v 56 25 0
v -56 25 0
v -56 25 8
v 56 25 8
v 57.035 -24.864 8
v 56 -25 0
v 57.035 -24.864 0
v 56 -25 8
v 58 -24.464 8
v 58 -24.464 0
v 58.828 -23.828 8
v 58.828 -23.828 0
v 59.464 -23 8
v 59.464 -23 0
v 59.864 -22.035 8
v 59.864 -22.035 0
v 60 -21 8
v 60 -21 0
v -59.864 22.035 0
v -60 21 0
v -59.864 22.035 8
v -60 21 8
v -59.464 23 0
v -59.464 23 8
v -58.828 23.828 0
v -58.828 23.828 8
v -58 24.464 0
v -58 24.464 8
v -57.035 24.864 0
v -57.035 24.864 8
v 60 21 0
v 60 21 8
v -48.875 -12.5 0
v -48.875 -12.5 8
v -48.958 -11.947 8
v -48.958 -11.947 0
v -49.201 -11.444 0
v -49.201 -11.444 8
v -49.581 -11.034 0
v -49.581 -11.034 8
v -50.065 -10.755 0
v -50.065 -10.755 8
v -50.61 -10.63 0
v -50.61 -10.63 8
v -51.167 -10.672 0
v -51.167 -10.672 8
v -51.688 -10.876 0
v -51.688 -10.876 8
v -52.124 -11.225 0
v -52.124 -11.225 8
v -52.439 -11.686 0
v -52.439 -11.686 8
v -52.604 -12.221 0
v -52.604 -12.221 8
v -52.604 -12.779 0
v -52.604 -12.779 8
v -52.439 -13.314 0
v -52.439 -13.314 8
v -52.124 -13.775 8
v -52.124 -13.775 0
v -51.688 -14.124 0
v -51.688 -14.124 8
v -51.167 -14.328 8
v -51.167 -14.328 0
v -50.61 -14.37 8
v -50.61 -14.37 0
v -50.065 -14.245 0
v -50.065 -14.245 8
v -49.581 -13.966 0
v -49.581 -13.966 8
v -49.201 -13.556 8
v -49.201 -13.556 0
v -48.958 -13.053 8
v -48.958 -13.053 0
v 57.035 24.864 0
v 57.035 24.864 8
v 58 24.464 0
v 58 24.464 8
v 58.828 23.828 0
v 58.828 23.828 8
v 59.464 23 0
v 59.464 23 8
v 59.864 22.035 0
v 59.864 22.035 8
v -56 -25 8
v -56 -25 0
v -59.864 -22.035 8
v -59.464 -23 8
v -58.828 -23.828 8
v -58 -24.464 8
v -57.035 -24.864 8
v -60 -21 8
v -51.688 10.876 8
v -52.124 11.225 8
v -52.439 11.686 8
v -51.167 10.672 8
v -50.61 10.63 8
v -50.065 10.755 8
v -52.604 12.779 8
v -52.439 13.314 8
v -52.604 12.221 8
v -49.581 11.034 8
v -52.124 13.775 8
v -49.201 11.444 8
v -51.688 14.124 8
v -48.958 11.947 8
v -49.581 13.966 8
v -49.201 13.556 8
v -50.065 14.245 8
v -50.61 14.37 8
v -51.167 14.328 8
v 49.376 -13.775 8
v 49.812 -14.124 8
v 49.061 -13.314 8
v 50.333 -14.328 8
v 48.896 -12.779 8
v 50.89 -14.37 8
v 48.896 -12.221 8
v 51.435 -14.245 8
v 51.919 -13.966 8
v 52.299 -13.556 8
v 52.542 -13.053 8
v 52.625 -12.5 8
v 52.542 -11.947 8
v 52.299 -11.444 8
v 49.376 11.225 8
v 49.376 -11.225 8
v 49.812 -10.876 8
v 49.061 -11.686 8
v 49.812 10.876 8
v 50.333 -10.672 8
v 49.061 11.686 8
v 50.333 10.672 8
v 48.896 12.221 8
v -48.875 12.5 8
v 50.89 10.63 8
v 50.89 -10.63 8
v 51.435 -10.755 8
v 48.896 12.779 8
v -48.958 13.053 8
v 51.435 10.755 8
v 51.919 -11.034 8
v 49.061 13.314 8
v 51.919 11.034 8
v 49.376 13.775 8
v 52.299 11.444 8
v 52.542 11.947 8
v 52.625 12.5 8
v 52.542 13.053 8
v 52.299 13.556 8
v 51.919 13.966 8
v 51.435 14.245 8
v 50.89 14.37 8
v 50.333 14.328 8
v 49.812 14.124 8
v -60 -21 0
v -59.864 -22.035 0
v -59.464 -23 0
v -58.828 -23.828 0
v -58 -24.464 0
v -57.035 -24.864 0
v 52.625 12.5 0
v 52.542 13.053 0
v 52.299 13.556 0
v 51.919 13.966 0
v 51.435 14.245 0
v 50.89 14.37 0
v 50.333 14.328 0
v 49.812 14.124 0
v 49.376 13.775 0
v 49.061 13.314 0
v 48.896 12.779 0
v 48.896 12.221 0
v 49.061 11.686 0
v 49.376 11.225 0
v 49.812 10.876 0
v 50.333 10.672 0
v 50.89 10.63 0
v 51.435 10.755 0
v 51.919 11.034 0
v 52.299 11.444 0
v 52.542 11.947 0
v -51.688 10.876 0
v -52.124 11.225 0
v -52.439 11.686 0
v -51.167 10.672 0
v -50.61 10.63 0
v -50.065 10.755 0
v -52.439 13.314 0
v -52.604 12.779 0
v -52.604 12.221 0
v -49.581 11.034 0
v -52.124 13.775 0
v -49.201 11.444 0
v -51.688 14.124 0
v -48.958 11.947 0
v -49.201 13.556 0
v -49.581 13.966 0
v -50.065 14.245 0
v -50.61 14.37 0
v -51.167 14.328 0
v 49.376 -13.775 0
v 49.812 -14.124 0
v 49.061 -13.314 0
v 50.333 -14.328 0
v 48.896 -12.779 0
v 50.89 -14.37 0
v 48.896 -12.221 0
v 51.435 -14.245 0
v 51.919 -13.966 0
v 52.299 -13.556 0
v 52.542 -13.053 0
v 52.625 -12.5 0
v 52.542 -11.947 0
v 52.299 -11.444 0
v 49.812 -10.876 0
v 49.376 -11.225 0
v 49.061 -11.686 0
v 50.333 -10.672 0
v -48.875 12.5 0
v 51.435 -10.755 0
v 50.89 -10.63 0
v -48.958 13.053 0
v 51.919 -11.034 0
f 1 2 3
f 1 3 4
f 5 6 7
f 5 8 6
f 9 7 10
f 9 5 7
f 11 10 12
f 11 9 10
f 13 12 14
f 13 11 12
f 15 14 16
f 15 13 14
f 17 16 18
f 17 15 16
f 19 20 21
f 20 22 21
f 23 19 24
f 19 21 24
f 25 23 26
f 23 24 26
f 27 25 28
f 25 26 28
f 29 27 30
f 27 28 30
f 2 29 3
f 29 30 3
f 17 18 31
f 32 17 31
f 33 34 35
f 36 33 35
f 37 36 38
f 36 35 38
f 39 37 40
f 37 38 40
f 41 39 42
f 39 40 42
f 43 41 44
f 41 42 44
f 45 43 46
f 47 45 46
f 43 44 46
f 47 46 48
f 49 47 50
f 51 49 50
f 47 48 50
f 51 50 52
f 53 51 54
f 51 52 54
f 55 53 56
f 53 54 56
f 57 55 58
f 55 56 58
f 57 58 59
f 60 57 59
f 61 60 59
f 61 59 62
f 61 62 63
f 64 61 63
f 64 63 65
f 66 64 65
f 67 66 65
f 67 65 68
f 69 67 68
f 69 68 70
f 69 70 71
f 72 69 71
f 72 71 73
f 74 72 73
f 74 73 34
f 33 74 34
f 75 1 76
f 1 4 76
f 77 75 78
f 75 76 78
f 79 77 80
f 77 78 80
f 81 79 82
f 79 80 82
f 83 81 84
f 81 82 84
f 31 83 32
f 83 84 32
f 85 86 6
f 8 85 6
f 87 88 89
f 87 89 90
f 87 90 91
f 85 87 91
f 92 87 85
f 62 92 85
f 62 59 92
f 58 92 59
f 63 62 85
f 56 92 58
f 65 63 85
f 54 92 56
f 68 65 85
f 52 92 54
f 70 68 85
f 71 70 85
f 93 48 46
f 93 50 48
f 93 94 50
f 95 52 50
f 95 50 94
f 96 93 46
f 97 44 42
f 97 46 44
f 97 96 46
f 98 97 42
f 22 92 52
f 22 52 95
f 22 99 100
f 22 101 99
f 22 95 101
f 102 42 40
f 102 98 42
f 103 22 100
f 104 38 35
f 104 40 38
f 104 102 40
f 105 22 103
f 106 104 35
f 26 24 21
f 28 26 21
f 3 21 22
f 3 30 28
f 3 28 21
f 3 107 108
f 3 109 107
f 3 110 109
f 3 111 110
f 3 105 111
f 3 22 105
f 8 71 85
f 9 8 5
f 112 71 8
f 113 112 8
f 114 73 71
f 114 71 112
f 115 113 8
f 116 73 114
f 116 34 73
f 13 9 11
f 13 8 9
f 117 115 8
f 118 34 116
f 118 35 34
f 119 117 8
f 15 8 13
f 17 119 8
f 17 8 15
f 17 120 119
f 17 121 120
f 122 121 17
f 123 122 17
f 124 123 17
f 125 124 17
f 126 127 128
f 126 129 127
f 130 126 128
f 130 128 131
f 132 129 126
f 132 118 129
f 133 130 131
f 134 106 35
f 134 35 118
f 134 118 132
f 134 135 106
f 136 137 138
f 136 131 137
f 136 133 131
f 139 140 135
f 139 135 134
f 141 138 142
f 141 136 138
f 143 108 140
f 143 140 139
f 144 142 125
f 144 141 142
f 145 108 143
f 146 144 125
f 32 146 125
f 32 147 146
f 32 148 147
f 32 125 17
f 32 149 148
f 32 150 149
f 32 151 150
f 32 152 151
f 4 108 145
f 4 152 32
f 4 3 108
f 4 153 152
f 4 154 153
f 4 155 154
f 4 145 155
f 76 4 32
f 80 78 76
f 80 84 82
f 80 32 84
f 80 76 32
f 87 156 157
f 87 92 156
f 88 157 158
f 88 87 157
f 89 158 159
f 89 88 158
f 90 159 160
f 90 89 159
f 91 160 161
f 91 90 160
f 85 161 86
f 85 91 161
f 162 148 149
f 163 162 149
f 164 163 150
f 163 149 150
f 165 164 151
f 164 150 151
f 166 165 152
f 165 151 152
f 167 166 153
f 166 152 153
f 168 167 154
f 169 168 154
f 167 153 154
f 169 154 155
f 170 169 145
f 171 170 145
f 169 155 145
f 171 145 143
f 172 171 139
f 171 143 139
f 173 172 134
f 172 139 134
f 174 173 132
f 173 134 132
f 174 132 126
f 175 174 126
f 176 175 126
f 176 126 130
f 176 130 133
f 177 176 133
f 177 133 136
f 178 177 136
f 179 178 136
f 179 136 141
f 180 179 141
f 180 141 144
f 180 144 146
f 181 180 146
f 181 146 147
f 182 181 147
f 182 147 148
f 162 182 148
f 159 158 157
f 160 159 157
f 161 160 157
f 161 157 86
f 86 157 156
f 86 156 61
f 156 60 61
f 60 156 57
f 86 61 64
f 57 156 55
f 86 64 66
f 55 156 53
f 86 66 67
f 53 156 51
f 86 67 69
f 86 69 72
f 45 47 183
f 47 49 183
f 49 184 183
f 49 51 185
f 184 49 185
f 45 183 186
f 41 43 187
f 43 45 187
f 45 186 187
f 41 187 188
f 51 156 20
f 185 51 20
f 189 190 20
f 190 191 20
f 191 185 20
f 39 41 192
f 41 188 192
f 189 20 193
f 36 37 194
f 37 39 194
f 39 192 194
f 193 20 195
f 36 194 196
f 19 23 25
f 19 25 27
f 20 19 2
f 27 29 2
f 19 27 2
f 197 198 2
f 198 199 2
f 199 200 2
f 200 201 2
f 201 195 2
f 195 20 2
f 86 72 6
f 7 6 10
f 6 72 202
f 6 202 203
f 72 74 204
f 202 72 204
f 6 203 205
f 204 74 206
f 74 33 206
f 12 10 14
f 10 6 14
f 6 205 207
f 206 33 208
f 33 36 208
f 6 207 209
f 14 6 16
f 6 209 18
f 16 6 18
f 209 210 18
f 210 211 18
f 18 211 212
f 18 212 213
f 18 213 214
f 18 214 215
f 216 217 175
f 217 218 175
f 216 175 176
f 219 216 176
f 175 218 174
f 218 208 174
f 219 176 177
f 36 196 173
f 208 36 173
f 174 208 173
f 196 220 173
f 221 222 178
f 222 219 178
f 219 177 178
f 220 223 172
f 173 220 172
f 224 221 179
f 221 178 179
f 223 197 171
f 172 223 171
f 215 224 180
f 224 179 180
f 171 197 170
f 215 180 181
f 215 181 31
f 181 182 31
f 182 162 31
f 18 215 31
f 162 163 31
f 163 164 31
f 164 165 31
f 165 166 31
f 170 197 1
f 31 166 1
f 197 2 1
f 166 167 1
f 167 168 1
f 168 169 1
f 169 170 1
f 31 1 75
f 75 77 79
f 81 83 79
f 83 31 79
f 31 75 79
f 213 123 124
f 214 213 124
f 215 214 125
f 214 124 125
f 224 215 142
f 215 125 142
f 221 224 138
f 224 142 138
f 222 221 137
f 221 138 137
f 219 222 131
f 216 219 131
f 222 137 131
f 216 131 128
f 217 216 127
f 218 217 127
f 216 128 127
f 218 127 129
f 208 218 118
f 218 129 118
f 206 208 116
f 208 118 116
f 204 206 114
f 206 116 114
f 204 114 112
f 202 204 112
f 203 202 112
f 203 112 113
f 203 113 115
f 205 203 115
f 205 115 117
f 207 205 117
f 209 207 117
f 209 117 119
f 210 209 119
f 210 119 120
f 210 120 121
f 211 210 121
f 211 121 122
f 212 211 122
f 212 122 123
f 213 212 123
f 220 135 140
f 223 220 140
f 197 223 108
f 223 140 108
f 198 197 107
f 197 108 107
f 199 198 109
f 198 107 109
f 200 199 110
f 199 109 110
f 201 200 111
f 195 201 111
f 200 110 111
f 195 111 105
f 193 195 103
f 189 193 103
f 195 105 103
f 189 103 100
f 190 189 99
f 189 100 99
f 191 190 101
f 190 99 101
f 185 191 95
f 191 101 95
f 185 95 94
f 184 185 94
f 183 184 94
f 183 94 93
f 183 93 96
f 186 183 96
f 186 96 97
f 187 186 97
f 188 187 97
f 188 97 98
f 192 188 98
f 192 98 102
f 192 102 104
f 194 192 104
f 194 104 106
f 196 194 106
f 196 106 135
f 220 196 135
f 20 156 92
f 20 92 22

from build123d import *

# Parameters (mm, degrees)
SKETCH_W     = 120
SKETCH_H     = 50
PAD_DEPTH    = 8
SKETCH001_R  = 1.875
POCKET_DEPTH = 8.001
FILLET_R     = 4


with BuildPart() as part:
    # Sketch → Pad (new body)
    with BuildSketch(Plane.XY):
        Rectangle(SKETCH_W, SKETCH_H)
    extrude(amount=PAD_DEPTH)

    # Sketch001 (on Face6 of Pad) → Pocket (cut, through all)
    with BuildSketch(Plane.XY.offset(8)):
        with Locations((-50.75, 12.5)):
            Circle(SKETCH001_R)
        with Locations((50.75, 12.5)):
            Circle(SKETCH001_R)
        with Locations((-50.75, -12.5)):
            Circle(SKETCH001_R)
        with Locations((50.75, -12.5)):
            Circle(SKETCH001_R)
    extrude(amount=-POCKET_DEPTH, mode=Mode.SUBTRACT)

    # Fillet
    fillet_edges = [part.edges().sort_by_distance(p)[0] for p in [
        (-60, 25, 4),
        (-60, -25, 4),
        (60, -25, 4),
        (60, 25, 4),
    ]]
    fillet(fillet_edges, radius=FILLET_R)


solid = part.part
